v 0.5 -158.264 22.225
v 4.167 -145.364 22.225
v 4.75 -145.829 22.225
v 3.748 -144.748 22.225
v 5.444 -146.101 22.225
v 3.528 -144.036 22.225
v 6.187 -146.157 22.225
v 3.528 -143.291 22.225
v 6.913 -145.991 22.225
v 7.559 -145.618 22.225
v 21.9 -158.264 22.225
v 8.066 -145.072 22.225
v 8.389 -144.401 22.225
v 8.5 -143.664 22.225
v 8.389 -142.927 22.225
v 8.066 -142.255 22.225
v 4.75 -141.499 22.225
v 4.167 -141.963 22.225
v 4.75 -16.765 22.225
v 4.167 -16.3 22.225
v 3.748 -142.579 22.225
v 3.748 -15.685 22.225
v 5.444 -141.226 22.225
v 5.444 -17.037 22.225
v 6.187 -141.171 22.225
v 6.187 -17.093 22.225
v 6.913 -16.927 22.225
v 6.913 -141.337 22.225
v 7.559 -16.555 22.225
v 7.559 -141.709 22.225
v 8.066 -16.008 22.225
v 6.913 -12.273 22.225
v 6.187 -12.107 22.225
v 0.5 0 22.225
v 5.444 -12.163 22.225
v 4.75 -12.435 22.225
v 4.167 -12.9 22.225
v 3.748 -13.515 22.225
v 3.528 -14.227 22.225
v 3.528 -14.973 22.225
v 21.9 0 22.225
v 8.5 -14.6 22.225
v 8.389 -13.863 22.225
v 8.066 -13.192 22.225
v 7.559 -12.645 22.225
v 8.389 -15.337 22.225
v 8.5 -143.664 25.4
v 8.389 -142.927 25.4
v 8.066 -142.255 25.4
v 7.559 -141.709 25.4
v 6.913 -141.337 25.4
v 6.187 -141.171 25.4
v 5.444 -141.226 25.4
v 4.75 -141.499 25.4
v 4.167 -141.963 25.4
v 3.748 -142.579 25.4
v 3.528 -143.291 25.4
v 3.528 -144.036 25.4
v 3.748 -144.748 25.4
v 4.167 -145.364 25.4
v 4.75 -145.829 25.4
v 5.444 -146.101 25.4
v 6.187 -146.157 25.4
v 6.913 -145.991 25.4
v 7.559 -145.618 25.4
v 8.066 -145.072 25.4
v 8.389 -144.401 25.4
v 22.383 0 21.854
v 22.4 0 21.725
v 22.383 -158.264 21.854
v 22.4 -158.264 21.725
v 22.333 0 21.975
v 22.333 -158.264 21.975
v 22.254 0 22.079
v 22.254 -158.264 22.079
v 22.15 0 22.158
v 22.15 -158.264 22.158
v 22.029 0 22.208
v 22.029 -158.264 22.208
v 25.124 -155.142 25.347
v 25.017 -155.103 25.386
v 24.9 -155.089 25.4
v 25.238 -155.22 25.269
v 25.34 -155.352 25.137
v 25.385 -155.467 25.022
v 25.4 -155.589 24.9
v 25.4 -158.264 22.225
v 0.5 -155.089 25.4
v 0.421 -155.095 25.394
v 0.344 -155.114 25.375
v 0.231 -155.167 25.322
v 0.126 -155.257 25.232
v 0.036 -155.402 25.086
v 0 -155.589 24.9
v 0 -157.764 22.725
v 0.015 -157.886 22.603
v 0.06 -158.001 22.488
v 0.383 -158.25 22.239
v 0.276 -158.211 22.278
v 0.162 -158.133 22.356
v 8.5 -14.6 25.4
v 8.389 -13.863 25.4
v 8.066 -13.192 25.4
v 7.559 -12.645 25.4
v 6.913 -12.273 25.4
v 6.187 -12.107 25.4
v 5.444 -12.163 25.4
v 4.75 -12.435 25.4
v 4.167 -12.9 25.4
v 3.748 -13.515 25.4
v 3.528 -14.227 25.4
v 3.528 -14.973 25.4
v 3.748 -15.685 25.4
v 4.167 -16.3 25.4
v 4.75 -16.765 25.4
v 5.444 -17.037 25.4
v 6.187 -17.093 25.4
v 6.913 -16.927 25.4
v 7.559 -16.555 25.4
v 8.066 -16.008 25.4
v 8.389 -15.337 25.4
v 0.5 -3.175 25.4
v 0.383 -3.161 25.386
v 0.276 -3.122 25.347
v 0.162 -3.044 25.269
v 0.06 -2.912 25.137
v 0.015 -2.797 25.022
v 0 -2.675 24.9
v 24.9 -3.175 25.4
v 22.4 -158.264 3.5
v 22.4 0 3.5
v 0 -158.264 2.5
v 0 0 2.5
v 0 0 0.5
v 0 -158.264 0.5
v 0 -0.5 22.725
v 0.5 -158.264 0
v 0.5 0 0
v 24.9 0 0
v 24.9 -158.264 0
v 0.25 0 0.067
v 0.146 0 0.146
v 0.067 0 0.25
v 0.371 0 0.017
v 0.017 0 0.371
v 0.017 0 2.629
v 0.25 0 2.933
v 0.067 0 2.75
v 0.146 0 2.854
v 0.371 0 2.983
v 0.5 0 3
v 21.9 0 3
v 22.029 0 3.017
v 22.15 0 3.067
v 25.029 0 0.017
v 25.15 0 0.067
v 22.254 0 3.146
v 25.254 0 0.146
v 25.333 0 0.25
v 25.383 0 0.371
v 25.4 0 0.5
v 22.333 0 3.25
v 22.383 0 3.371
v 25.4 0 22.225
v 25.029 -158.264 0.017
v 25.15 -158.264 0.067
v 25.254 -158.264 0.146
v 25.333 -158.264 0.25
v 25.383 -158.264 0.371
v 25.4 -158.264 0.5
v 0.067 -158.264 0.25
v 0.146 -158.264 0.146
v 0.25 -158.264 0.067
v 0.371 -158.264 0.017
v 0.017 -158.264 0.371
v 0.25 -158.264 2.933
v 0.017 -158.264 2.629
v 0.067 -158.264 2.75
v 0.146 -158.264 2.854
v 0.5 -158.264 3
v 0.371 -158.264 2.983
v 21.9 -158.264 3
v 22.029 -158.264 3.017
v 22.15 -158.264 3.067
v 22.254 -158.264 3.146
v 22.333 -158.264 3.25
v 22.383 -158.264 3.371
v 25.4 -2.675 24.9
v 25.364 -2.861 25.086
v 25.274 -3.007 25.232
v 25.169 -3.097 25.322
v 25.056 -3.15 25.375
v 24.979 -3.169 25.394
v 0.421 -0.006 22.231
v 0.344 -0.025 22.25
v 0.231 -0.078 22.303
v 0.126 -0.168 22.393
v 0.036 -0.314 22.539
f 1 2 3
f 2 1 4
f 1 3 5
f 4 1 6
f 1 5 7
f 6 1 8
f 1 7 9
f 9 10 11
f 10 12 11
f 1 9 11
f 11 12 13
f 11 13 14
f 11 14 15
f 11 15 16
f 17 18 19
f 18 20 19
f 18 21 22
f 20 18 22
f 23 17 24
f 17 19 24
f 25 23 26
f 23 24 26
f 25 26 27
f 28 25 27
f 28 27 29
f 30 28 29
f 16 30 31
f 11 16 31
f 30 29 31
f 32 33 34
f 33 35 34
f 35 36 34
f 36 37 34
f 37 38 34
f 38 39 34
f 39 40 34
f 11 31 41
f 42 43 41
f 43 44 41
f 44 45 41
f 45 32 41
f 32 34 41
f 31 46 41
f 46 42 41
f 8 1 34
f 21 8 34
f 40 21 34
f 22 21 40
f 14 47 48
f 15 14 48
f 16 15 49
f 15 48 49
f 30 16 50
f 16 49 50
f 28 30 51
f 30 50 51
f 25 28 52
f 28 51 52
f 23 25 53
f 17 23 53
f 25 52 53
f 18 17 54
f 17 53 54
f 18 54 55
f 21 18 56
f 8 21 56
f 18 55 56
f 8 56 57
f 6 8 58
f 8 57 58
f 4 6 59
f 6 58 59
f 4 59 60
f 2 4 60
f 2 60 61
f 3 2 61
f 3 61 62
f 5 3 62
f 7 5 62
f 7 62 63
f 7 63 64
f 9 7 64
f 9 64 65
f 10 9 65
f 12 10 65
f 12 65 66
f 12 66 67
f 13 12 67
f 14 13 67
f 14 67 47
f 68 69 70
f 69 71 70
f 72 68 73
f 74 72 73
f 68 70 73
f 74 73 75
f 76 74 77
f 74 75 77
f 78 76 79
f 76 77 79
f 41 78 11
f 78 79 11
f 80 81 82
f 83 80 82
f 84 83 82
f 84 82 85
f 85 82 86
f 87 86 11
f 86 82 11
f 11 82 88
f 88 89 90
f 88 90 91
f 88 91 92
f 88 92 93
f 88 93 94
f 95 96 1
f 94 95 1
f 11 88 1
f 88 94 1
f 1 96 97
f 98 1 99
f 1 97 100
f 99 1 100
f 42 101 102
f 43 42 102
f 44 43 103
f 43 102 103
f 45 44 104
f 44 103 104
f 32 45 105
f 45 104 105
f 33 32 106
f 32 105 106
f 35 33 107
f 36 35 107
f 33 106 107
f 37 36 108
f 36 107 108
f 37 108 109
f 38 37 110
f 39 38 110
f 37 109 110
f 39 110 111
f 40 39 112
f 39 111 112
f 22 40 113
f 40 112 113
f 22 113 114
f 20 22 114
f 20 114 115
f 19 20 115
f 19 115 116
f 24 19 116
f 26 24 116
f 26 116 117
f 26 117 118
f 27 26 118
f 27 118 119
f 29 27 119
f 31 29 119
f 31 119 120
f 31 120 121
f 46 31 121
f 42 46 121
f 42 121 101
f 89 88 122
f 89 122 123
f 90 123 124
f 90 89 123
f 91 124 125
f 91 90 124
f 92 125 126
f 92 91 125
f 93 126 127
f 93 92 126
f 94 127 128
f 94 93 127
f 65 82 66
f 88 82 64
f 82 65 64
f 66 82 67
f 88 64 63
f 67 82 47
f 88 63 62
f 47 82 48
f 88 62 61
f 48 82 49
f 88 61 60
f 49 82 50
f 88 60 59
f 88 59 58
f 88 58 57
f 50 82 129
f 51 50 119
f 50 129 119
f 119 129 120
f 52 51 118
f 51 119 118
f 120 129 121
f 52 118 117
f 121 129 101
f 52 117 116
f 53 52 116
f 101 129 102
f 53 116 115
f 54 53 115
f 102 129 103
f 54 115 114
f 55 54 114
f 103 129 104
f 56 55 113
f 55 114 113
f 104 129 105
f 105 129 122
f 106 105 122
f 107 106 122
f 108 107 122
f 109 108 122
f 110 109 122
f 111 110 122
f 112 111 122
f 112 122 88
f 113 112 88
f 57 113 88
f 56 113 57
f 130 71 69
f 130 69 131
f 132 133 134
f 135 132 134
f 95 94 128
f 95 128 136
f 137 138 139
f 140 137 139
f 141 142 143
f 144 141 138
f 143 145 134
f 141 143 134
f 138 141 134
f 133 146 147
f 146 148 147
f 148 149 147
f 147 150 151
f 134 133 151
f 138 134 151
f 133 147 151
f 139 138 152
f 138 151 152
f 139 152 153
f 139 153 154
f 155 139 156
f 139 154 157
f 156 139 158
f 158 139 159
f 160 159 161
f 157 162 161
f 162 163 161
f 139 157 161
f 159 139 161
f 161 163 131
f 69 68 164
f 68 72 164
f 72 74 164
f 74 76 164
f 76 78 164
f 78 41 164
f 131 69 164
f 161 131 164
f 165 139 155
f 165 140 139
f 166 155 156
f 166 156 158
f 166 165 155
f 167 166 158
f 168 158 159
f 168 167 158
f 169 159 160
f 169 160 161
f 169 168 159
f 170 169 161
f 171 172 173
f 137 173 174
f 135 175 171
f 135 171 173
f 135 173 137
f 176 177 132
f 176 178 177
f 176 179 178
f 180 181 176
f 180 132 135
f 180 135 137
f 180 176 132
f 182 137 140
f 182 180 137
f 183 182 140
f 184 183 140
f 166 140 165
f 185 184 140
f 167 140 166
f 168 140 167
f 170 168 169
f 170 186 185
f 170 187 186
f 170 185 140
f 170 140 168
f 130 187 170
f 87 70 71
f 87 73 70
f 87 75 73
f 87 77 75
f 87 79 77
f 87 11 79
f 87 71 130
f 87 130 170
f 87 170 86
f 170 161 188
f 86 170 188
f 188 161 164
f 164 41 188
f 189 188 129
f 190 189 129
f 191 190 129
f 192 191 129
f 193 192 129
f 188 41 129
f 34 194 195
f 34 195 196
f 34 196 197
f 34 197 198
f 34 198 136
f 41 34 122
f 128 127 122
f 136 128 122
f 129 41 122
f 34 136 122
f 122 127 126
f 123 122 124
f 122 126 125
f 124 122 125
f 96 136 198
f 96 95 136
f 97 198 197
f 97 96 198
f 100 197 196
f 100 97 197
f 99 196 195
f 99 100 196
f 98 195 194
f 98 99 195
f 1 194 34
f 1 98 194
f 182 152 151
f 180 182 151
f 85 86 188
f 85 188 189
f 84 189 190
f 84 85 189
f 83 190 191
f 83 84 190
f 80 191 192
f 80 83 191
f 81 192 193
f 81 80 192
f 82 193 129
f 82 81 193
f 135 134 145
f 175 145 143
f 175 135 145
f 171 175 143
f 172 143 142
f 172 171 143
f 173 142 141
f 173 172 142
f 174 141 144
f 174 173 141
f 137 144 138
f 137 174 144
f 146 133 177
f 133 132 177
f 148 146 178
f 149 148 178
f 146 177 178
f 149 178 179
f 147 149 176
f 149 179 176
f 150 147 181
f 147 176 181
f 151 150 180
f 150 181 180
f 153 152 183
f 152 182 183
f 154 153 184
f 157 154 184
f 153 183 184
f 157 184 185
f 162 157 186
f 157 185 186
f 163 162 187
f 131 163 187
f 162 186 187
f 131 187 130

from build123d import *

# Parameters (mm, degrees)
F1_DEPTH = 158.26371
F2_R     = 2.5
F3_DEPTH = 5
F4_R     = 0.5
F6_DEPTH = 25.401


with BuildPart() as f1:
    # F0 (on Front) → F1 (new body)
    with BuildSketch(Plane.XZ):
        Polygon((0, 3), (0, 0), (25.4, 0), (25.4, 25.4), (0, 25.4), (0, 22.225), (22.4, 22.225), (22.4, 3), align=None)
    extrude(amount=F1_DEPTH)

    # F2 (on face) → F3 (cut)
    with BuildSketch(Plane.XY.offset(25.4)):
        with Locations((6, -14.6)):
            Circle(F2_R)
        with Locations((6, -143.66371)):
            Circle(F2_R)
        with Locations((6, -243.66371)):
            Circle(F2_R)
        with Locations((6, -343.66371)):
            Circle(F2_R)
        with Locations((6, -443.66371)):
            Circle(F2_R)
    extrude(amount=-F3_DEPTH, mode=Mode.SUBTRACT)

    # F4
    f4_edges = [f1.edges().sort_by_distance(p)[0] for p in [
        (0, -79.131855, 25.4),
        (0, -79.131855, 22.225),
        (25.4, -79.131855, 25.4),
        (22.4, -79.131855, 3),
        (0, -79.131855, 3),
        (0, -79.131855, 0),
        (22.4, -79.131855, 22.225),
        (25.4, -79.131855, 0),
    ]]
    fillet(f4_edges, radius=F4_R)

    # F5 (on face) → F6 (cut, through all)
    with BuildSketch(Plane(origin=(0, 0, 0), x_dir=(0, -1, 0), z_dir=(-1, 0, 0))):
        Polygon((0, 25.4), (0, 22.225), (3.175, 25.4), align=None)
        Polygon((155.08871, 25.4), (158.26371, 22.225), (158.26371, 25.4), align=None)
    extrude(amount=-F6_DEPTH, mode=Mode.SUBTRACT)


solid = f1.part
